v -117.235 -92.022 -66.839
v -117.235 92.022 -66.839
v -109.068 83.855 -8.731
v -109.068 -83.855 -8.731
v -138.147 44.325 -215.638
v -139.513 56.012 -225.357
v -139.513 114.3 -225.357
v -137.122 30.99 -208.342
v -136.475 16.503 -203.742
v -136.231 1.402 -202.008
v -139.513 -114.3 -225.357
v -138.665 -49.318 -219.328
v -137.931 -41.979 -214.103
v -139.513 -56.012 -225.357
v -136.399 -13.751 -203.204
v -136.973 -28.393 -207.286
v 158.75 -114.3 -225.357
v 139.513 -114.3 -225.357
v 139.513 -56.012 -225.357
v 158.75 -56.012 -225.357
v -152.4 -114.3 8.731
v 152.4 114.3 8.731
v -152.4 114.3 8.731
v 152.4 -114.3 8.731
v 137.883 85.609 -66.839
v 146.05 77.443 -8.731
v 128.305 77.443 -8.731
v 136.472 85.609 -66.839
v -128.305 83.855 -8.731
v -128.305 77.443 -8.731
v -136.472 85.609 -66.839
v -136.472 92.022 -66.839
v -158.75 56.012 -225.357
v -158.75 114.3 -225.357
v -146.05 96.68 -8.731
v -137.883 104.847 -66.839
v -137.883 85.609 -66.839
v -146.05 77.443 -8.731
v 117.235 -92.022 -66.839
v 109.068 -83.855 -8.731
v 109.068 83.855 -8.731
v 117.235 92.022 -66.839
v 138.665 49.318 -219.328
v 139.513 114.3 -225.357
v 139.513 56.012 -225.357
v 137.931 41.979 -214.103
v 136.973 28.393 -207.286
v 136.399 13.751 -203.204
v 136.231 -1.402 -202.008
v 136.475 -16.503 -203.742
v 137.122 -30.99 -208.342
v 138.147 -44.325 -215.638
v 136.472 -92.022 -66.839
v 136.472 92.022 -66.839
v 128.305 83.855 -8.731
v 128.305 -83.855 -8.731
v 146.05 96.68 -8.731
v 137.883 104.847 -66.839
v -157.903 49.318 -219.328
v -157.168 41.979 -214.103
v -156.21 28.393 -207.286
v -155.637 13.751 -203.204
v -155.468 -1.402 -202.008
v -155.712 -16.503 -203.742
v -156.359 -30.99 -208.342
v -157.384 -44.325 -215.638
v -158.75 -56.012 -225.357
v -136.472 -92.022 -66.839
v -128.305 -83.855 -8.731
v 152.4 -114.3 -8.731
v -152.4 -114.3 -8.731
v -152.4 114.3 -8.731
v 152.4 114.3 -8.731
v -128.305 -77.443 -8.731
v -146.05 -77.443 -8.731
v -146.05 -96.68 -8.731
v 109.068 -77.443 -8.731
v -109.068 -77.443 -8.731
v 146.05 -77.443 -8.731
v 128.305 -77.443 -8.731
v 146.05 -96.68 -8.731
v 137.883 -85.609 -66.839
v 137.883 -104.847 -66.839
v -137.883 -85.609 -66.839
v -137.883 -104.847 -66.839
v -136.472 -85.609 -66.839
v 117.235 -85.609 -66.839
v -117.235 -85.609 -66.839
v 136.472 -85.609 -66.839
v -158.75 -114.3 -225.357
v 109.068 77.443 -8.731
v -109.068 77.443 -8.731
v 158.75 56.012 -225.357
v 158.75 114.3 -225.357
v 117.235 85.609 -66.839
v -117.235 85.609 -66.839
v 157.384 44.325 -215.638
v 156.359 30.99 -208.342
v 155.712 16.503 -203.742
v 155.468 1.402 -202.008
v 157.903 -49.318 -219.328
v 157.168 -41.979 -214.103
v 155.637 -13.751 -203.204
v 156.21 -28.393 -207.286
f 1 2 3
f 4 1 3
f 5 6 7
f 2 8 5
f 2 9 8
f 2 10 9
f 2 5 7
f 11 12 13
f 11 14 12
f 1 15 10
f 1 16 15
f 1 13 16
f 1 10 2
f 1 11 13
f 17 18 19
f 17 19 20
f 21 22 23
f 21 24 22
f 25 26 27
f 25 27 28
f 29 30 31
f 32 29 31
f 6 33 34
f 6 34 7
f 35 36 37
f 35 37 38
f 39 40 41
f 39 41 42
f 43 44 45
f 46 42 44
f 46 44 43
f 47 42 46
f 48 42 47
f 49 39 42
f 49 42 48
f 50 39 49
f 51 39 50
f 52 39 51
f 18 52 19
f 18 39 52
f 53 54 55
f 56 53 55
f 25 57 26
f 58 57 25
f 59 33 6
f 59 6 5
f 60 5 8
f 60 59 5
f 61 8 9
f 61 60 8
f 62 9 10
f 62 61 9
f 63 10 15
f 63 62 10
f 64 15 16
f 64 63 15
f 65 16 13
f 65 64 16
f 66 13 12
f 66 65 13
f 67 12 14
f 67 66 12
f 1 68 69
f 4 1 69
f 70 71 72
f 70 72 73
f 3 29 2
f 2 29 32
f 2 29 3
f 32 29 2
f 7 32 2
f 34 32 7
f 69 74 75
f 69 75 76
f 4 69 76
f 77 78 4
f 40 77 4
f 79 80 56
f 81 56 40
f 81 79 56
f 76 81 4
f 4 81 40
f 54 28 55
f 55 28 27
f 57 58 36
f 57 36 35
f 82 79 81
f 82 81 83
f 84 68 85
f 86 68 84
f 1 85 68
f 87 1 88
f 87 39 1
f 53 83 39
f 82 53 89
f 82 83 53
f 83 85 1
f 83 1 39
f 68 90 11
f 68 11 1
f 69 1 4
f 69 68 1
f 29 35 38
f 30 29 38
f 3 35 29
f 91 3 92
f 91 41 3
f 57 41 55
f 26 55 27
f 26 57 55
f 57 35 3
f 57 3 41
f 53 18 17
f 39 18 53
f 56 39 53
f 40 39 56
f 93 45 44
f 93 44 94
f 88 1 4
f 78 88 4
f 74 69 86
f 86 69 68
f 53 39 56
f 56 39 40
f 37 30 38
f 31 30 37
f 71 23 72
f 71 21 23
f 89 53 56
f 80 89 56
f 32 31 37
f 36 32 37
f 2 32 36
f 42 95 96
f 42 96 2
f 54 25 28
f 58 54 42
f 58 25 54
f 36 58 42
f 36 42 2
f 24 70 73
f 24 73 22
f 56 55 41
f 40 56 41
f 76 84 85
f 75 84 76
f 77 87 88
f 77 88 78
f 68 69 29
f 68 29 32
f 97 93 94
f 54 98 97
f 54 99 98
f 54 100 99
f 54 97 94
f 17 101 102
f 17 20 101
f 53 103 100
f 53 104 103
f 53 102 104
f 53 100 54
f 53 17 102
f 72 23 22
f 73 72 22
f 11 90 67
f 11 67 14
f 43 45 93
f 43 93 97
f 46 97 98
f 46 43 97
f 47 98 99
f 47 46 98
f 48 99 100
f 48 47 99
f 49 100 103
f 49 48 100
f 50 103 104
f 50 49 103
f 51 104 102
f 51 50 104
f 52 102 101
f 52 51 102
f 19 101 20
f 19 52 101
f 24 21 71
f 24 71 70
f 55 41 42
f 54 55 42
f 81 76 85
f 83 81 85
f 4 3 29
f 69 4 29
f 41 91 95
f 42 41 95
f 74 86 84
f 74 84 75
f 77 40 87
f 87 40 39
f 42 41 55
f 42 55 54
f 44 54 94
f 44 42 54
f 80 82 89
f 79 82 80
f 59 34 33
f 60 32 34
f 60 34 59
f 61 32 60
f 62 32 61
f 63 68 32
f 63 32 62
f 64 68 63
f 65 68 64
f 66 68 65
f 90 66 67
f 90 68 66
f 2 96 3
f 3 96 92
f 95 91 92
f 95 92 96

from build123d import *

# Parameters (mm, degrees)
F1_DEPTH      = 114.3
F2_DEPTH      = 114.3
F2_DEPTH_BACK = 114.3
F4_DEPTH      = 158.751
F4_DEPTH_BACK = 158.751
F6_DEPTH      = 152.4
F6_DEPTH_BACK = 152.4
F7_DEPTH      = 114.301
F7_DEPTH_BACK = 114.301


with BuildPart() as f1:
    # F0 (on Front) → F1 (new body, symmetric)
    with BuildSketch(Plane.XZ):
        Polygon((-152.4, 8.73125), (-152.4, -8.73125), (-146.05, -8.73125), (-128.3052212236, -8.73125), (-109.0680059671, -8.73125), (109.0680059671, -8.73125), (128.3052212236, -8.73125), (146.05, -8.73125), (152.4, -8.73125), (152.4, 8.73125), align=None)
    extrude(amount=F1_DEPTH, both=True)


with BuildPart() as f2:
    # F0 (on Front) → F2 (new body, two sides)
    with BuildSketch(Plane.XZ) as f2_sk:
        Polygon((-109.0680059671, -8.73125), (-128.3052212236, -8.73125), (-136.4717662259, -66.8392370463), (-117.2345509694, -66.8392370463), align=None)
        Polygon((-117.2345509694, -66.8392370463), (-136.4717662259, -66.8392370463), (-158.75, -225.3571071106), (-139.5127847435, -225.3571071106), align=None)
    extrude(amount=F2_DEPTH)
    extrude(f2_sk.sketch, amount=-F2_DEPTH_BACK)


with BuildPart() as f2b:
    # F0 (on Front) → F2, piece 2 (new body, two sides)
    with BuildSketch(Plane.XZ) as f2_2_sk:
        Polygon((128.3052212236, -8.73125), (109.0680059671, -8.73125), (117.2345509694, -66.8392370463), (136.4717662259, -66.8392370463), align=None)
        Polygon((136.4717662259, -66.8392370463), (117.2345509694, -66.8392370463), (139.5127847435, -225.3571071106), (158.75, -225.3571071106), align=None)
    extrude(amount=F2_DEPTH)
    extrude(f2_2_sk.sketch, amount=-F2_DEPTH_BACK)


with BuildPart() as f4_tool:
    # F3 (on Right) → F4 (new body, two sides)
    with BuildSketch(Plane.YZ) as f4_sk:
        Polygon((-114.3, -225.3571071106), (-83.8552212236, -8.73125), (-114.3000000004, -8.73125), align=None)
        with BuildLine():
            Line((-56.0122208133, -225.3571071106), (56.0122208133, -225.3571071106))
            ThreePointArc((56.0122208133, -225.3571071106), (0, -201.9951121331), (-56.0122208133, -225.3571071106))
        make_face()
        Polygon((114.3, -225.3571071106), (114.3, -8.73125), (83.8552212236, -8.73125), align=None)
    extrude(amount=-F4_DEPTH)
    extrude(f4_sk.sketch, amount=F4_DEPTH_BACK)


with BuildPart() as f2_1:
    add(f2.part)

    # F4: cut by f4_tool
    add(f4_tool.part, mode=Mode.SUBTRACT)


with BuildPart() as f2b_1:
    add(f2b.part)

    # F4: cut by f4_tool
    add(f4_tool.part, mode=Mode.SUBTRACT)


with BuildPart() as f6:
    # F5 (on Right) → F6 (new body, two sides)
    with BuildSketch(Plane.YZ) as f6_sk:
        Polygon((-77.4428161381, -8.73125), (-83.8552212236, -8.73125), (-92.021766226, -66.8392370463), (-85.6093611405, -66.8392370463), align=None)
        Polygon((-92.021766226, -66.8392370463), (-83.8552212236, -8.73125), (-96.6800313946, -8.73125), (-104.846576397, -66.8392370463), align=None)
    extrude(amount=F6_DEPTH)
    extrude(f6_sk.sketch, amount=-F6_DEPTH_BACK)


with BuildPart() as f6b:
    # F5 (on Right) → F6, piece 2 (new body, two sides)
    with BuildSketch(Plane.YZ) as f6_2_sk:
        Polygon((83.8552212236, -8.73125), (77.4428161381, -8.73125), (85.6093611405, -66.8392370463), (92.0217662259, -66.8392370463), align=None)
        Polygon((96.6800313946, -8.73125), (83.8552212236, -8.73125), (92.0217662259, -66.8392370463), (104.846576397, -66.8392370463), align=None)
    extrude(amount=F6_DEPTH)
    extrude(f6_2_sk.sketch, amount=-F6_DEPTH_BACK)


with BuildPart() as f7_tool:
    # F0 (on Front) → F7 (new body, two sides)
    with BuildSketch(Plane.XZ) as f7_sk:
        Polygon((-146.05, -8.73125), (-152.4, -8.73125), (-152.4, -66.8392370463), (-137.8834549976, -66.8392370463), align=None)
        Polygon((152.4, -66.8392370463), (152.4, -8.73125), (146.05, -8.73125), (137.8834549976, -66.8392370463), align=None)
    extrude(amount=-F7_DEPTH)
    extrude(f7_sk.sketch, amount=F7_DEPTH_BACK)


with BuildPart() as f6_1:
    add(f6.part)

    # F7: cut by f7_tool
    add(f7_tool.part, mode=Mode.SUBTRACT)

    # F10: cut F2
    add(f2_1.part, mode=Mode.SUBTRACT)

    # F11: cut F2b
    add(f2b_1.part, mode=Mode.SUBTRACT)


with BuildPart() as f6b_1:
    add(f6b.part)

    # F7: cut by f7_tool
    add(f7_tool.part, mode=Mode.SUBTRACT)

    # F8: cut F2
    add(f2_1.part, mode=Mode.SUBTRACT)

    # F9: cut F2b
    add(f2b_1.part, mode=Mode.SUBTRACT)


solid = Compound([f1.part, f2_1.part, f2b_1.part, f6_1.part, f6b_1.part])
